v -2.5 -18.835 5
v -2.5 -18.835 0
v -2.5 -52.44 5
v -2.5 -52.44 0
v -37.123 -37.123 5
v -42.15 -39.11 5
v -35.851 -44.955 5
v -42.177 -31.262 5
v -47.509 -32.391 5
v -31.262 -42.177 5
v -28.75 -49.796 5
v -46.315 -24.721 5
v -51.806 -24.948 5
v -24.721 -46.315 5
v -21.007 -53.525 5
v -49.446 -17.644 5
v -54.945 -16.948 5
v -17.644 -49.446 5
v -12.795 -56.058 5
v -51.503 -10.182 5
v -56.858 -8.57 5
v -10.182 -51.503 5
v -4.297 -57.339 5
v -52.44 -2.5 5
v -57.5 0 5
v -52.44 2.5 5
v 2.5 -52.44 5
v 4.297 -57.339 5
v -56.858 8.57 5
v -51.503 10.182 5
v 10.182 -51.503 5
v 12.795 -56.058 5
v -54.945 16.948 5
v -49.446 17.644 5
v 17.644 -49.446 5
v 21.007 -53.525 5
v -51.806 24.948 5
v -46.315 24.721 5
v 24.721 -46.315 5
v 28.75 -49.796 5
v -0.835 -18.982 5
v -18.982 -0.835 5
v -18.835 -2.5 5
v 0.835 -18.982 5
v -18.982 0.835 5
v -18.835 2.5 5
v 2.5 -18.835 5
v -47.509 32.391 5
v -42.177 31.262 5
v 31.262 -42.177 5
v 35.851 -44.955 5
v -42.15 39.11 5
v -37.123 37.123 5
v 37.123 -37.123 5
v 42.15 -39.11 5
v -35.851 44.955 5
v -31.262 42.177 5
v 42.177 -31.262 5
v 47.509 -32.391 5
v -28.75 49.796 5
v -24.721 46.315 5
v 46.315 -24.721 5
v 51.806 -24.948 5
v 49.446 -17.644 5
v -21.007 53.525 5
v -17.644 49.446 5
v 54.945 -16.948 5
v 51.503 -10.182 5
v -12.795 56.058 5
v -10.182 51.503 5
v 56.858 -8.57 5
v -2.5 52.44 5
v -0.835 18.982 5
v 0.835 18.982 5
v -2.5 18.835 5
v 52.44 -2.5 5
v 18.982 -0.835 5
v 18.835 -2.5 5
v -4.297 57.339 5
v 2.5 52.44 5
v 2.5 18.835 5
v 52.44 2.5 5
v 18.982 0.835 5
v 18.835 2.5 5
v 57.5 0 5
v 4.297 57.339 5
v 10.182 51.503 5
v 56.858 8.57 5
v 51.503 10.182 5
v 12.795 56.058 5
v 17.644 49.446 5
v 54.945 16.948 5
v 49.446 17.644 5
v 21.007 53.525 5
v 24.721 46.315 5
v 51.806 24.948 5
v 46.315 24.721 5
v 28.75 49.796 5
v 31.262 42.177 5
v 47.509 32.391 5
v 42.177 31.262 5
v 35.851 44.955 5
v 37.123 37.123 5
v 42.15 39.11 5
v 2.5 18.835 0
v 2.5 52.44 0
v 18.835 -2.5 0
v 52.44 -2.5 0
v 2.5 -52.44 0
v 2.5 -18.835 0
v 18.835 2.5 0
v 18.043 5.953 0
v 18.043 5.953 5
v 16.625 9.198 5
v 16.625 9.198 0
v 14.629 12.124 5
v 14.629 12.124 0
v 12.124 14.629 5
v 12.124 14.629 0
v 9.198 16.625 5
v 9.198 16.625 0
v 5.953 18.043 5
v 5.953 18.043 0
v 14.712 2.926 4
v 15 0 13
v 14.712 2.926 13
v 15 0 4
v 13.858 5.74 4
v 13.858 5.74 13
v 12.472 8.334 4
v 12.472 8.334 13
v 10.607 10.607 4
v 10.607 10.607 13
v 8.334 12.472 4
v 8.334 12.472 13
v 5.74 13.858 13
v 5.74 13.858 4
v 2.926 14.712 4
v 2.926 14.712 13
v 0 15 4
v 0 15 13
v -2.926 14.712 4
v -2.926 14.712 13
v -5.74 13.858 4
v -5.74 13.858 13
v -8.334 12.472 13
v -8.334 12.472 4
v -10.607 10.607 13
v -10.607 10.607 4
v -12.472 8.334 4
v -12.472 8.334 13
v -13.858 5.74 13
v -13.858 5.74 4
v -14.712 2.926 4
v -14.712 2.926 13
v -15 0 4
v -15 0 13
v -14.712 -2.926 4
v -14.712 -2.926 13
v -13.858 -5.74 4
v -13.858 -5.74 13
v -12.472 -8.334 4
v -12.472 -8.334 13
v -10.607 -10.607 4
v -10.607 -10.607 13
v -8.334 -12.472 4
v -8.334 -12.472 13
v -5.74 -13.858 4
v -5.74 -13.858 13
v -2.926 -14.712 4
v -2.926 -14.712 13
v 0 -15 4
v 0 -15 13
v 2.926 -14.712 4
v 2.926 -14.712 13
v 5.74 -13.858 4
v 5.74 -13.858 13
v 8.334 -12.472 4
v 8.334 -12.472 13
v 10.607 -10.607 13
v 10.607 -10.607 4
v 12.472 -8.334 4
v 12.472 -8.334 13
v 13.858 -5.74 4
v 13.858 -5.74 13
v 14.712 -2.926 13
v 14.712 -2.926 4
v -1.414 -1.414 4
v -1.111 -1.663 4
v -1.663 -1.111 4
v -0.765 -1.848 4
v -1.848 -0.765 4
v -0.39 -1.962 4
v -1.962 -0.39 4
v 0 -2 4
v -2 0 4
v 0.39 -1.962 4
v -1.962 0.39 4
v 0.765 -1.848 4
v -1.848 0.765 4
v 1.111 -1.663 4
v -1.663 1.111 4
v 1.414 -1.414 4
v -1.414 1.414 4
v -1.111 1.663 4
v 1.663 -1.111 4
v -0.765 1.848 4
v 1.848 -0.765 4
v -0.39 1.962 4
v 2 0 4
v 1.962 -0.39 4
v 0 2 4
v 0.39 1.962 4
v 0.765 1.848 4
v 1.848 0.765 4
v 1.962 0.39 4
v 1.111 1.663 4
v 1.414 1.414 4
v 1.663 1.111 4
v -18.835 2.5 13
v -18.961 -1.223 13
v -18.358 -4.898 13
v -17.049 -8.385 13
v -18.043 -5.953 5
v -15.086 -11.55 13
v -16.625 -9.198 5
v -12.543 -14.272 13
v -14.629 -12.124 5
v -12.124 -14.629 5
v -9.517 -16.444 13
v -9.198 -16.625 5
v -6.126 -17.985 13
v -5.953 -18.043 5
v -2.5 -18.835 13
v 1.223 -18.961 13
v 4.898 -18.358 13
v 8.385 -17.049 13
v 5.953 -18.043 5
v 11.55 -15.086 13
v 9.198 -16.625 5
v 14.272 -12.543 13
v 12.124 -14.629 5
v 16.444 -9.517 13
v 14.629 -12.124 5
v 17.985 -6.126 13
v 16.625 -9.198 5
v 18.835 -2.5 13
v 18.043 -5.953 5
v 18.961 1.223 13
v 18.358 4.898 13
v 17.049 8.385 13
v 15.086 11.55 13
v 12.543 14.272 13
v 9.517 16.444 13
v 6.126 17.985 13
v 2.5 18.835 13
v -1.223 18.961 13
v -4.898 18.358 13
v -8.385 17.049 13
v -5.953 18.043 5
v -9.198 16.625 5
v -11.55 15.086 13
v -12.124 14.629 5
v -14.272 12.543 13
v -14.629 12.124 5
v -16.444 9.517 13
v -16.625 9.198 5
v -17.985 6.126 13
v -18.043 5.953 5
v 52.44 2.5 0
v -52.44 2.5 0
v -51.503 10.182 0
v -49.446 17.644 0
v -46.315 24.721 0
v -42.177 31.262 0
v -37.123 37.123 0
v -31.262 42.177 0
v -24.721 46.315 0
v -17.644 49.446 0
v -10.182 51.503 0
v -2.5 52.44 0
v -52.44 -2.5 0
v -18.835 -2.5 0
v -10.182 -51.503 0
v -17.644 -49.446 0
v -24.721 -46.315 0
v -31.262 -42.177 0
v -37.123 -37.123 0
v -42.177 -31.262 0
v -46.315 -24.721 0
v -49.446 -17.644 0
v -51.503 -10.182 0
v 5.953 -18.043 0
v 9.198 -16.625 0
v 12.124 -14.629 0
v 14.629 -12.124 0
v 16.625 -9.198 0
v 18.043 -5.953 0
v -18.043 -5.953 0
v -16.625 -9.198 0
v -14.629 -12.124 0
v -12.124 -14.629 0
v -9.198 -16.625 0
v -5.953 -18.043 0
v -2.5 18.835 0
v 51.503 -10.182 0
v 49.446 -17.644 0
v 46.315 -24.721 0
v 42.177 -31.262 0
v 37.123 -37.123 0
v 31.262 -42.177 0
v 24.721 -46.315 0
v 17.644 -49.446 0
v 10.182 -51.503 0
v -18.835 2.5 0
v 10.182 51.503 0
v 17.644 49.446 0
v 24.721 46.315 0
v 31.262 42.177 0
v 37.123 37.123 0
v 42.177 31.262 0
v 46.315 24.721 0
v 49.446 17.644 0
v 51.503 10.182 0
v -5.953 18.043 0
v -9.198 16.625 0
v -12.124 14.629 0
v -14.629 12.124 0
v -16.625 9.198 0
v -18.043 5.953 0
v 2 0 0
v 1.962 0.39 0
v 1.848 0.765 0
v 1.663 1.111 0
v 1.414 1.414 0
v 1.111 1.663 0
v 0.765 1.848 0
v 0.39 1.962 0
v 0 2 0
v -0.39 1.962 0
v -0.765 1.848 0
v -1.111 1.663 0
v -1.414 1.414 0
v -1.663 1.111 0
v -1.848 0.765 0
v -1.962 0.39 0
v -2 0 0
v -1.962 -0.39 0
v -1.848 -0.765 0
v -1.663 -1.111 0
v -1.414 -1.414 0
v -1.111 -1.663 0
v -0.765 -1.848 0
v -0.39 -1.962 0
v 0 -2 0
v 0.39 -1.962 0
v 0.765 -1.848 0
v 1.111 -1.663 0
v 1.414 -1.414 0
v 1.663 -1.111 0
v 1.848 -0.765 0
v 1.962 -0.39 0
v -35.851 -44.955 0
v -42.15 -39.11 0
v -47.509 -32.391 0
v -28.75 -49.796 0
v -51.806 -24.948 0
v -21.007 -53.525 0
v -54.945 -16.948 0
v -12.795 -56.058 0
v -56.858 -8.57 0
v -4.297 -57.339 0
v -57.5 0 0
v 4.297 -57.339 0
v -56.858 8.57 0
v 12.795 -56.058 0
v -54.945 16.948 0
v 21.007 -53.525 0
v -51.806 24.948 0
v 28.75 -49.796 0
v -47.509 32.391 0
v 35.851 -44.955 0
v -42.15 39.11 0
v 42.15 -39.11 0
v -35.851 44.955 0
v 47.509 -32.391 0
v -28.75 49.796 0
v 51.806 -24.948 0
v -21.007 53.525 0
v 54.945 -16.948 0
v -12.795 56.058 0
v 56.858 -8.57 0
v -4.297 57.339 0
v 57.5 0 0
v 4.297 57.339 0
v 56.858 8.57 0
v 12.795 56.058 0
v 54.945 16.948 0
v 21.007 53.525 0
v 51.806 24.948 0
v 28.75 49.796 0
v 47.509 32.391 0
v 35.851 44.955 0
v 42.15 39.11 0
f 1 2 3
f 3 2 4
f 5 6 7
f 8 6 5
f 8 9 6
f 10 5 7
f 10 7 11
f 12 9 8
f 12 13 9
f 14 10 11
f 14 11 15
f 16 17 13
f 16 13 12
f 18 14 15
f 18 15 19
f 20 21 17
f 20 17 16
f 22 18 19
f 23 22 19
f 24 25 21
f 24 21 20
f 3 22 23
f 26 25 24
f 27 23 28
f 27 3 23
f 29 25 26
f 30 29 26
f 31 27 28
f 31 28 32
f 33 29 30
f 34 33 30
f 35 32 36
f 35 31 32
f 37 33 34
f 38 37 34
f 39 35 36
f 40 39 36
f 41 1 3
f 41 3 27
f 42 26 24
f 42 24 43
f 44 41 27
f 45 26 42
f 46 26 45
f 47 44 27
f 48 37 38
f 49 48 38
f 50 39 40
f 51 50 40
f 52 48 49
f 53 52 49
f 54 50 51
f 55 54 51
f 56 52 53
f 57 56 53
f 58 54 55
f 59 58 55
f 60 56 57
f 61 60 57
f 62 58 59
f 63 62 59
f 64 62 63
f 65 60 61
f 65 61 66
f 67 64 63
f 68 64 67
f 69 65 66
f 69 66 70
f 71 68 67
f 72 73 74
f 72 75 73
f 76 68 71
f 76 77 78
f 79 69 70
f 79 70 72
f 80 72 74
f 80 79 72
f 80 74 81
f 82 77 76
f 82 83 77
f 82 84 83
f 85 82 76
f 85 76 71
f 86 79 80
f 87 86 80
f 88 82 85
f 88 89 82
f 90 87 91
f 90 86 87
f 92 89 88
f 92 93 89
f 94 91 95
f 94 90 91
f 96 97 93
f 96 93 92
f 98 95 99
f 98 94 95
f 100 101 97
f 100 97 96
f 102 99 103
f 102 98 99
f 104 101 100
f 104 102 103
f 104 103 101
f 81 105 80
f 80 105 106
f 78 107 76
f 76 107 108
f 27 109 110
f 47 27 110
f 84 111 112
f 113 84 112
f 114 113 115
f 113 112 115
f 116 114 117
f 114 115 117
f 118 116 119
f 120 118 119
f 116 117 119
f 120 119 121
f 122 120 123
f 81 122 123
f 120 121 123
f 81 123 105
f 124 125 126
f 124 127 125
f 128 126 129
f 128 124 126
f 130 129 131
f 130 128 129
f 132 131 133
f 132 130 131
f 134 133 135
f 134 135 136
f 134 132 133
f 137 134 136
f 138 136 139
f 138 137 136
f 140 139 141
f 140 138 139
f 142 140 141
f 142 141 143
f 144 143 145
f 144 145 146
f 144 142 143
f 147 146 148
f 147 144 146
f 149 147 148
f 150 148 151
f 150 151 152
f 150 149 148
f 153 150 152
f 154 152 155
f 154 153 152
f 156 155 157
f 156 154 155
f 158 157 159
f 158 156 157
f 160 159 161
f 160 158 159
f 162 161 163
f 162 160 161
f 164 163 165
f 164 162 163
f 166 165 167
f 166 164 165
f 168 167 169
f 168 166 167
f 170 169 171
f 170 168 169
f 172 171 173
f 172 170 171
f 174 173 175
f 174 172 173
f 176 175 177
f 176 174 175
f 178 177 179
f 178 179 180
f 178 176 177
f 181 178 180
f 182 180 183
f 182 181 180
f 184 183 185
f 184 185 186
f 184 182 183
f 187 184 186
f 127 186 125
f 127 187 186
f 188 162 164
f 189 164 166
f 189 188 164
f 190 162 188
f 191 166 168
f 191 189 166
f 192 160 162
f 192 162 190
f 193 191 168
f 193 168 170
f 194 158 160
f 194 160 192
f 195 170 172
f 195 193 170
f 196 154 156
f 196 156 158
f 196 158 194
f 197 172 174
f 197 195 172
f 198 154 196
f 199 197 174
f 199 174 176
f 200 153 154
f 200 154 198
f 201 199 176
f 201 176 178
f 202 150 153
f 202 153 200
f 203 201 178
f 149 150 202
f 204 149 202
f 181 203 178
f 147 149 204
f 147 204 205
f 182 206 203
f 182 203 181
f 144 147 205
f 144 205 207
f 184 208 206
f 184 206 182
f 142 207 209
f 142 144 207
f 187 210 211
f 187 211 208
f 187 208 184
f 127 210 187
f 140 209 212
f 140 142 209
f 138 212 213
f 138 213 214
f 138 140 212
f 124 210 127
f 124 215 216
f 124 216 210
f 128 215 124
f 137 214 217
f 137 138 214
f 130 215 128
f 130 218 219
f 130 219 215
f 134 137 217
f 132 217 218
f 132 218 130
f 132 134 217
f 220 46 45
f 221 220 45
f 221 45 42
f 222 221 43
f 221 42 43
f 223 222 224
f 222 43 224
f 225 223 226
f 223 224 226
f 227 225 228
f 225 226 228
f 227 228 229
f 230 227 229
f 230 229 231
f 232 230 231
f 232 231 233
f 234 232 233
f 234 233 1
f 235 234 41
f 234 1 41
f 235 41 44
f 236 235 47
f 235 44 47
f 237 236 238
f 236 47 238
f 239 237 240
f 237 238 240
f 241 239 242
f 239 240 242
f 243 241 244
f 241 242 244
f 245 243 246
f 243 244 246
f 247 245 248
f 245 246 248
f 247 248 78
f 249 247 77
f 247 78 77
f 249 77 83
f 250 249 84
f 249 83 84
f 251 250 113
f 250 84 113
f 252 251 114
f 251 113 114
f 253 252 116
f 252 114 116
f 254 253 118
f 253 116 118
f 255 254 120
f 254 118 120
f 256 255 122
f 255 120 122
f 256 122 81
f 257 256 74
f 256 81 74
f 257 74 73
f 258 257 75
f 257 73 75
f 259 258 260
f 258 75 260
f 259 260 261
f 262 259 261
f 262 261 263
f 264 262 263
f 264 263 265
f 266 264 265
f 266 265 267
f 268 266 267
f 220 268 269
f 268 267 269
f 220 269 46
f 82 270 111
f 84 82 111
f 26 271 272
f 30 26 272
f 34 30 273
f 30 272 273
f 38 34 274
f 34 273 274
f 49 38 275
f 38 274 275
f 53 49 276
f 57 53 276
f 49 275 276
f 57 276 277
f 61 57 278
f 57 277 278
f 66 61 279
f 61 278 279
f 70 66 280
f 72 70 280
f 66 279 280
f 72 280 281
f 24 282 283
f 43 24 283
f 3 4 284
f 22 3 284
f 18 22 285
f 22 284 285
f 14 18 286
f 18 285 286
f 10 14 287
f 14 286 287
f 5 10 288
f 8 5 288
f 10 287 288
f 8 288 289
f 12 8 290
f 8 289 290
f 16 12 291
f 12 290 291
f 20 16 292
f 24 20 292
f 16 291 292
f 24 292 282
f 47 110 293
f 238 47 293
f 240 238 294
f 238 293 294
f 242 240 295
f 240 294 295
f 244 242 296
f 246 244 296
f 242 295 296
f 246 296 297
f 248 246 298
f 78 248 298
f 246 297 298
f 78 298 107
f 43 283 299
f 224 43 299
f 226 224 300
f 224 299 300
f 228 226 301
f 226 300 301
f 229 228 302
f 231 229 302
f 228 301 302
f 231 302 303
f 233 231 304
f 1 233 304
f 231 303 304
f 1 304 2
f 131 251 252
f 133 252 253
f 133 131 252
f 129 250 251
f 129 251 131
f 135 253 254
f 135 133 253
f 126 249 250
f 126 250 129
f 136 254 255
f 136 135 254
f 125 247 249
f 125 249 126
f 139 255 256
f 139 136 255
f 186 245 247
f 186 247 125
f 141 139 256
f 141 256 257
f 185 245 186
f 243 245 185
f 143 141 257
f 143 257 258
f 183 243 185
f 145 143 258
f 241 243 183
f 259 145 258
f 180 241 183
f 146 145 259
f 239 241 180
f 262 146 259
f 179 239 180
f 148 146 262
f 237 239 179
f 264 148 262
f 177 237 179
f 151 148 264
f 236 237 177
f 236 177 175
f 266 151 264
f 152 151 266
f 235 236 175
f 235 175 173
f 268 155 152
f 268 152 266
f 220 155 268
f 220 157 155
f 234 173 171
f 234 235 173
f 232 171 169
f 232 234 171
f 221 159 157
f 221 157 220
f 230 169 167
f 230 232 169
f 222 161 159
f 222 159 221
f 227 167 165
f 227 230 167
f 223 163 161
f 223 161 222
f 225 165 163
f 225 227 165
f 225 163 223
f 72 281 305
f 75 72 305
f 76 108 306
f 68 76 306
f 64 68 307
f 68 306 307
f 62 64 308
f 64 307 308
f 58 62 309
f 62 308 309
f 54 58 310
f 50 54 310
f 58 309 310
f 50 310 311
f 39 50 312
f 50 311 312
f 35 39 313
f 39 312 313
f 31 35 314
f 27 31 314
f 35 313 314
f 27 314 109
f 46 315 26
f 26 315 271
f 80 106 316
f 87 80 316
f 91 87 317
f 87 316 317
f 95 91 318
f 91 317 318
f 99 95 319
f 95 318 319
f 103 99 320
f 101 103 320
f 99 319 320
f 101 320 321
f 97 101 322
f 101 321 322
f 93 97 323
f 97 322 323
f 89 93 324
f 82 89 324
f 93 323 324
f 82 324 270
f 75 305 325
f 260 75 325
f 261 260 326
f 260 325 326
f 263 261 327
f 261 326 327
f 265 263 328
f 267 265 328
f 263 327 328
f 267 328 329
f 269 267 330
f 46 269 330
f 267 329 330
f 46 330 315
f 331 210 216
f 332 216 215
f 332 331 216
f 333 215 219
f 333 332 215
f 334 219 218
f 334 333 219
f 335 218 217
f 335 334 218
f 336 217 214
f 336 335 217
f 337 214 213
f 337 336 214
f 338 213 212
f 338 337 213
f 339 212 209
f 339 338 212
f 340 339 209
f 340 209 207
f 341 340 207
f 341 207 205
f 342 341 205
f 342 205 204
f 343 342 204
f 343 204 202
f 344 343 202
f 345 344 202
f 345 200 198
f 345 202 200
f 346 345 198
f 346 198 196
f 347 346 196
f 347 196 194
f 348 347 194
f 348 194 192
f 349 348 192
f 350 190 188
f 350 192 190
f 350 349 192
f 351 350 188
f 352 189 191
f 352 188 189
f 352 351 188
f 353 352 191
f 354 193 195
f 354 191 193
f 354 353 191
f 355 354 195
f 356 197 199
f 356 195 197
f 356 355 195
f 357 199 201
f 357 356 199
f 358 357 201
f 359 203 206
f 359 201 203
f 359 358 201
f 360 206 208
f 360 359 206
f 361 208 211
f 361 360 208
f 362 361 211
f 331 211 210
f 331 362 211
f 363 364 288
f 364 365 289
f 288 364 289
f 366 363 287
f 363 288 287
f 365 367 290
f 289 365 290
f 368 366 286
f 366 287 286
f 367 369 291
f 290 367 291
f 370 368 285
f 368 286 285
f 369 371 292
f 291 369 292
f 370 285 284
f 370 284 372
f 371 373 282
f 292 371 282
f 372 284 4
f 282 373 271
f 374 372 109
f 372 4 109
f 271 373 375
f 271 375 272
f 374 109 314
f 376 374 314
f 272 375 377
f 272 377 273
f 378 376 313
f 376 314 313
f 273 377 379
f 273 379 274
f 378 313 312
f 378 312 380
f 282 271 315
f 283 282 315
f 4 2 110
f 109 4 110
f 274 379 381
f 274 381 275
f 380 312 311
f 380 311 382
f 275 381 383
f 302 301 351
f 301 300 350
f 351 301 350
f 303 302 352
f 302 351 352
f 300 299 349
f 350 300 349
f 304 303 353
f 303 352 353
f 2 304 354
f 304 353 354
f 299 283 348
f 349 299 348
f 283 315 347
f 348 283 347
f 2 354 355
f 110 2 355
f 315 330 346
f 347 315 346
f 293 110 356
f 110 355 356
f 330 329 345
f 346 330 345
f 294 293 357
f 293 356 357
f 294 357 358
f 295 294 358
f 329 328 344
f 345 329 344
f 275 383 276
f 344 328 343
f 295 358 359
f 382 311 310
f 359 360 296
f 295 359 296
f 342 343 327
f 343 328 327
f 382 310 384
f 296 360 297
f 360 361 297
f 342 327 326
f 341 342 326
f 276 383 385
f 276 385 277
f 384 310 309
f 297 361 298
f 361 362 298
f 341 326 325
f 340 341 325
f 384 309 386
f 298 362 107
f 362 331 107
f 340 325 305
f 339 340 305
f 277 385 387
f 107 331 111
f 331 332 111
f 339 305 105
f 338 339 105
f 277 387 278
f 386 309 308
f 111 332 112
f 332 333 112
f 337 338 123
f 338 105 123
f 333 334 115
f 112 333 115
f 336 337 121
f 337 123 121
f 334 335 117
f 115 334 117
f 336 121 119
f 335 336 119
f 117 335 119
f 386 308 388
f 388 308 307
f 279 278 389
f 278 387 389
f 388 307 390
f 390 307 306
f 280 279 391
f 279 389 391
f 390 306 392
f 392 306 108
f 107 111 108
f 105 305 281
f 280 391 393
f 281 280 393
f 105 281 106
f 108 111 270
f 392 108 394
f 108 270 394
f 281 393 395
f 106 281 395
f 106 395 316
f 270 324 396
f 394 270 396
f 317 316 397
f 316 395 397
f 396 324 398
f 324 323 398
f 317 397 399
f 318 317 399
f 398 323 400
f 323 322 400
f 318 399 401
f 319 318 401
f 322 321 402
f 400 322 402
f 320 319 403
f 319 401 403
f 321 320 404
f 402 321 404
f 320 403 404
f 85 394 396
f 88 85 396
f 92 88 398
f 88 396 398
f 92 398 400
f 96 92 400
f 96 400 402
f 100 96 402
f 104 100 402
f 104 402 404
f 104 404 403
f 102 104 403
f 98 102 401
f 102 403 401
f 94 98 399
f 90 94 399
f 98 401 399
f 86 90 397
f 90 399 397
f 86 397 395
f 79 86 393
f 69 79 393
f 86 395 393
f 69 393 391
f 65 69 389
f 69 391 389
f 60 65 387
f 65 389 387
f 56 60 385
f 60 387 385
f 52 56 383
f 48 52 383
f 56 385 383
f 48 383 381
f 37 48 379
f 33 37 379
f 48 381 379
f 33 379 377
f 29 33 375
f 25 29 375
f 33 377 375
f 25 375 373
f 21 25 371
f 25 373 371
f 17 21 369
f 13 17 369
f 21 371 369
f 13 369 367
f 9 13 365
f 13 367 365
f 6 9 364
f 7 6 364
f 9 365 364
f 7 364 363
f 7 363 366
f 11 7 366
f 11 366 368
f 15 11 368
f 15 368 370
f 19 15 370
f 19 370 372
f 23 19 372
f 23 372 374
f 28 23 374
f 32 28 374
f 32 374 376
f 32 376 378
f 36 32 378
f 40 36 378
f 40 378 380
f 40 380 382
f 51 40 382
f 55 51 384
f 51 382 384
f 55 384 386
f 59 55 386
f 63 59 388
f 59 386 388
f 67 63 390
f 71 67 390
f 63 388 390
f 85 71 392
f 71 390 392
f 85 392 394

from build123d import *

# Parameters (mm, degrees)
SKETCH1_R           = 57.5
SKETCH1_R_2         = 2
BOSS_EXTRUDE1_DEPTH = 5
SKETCH2_R           = 15
CUT_EXTRUDE1_DEPTH  = 1
SKETCH3_R           = 19
SKETCH3_R_2         = 15
BOSS_EXTRUDE3_DEPTH = 8


with BuildPart() as part:
    # Sketch1 → Boss-Extrude1 (new body)
    # profile 1 of 6: a face of its own
    with BuildSketch(Plane.XY):
        Circle(SKETCH1_R)
        with BuildLine():
            ThreePointArc((-52.440442409, 2.5), (-37.123106012, 37.123106012), (-2.5, 52.440442409))
            Line((-2.5, 52.440442409), (-2.5, 18.834808202))
            ThreePointArc((-2.5, 18.834808202), (0, 19), (2.5, 18.834808202))
            Line((2.5, 18.834808202), (2.5, 52.440442409))
            ThreePointArc((2.5, 52.440442409), (37.123106012, 37.123106012), (52.440442409, 2.5))
            Line((52.440442409, 2.5), (18.834808202, 2.5))
            ThreePointArc((18.834808202, 2.5), (18.958657071, 1.252725861), (19, 0))
            ThreePointArc((19, 0), (18.958657071, -1.252725861), (18.834808202, -2.5))
            Line((18.834808202, -2.5), (52.440442409, -2.5))
            ThreePointArc((52.440442409, -2.5), (37.123106012, -37.123106012), (2.5, -52.440442409))
            Line((2.5, -52.440442409), (2.5, -18.834808202))
            ThreePointArc((2.5, -18.834808202), (0, -19), (-2.5, -18.834808202))
            Line((-2.5, -18.834808202), (-2.5, -52.440442409))
            ThreePointArc((-2.5, -52.440442409), (-37.123106012, -37.123106012), (-52.440442409, -2.5))
            Line((-52.440442409, -2.5), (-18.834808202, -2.5))
            ThreePointArc((-18.834808202, -2.5), (-19, 0), (-18.834808202, 2.5))
            Line((-18.834808202, 2.5), (-52.440442409, 2.5))
        make_face(mode=Mode.SUBTRACT)
    # profile 2 of 6: a face of its own
    with BuildSketch(Plane.XY):
        with BuildLine():
            Line((-2.5, 14.790199458), (-2.5, 18.834808202))
            ThreePointArc((-2.5, 18.834808202), (-13.435028843, 13.435028843), (-18.834808202, 2.5))
            Line((-18.834808202, 2.5), (-14.790199458, 2.5))
            ThreePointArc((-14.790199458, 2.5), (-10.606601718, 10.606601718), (-2.5, 14.790199458))
        make_face()
    # profile 3 of 6: a face of its own
    with BuildSketch(Plane.XY):
        with BuildLine():
            Line((-14.790199458, -2.5), (-18.834808202, -2.5))
            ThreePointArc((-18.834808202, -2.5), (-13.435028843, -13.435028843), (-2.5, -18.834808202))
            Line((-2.5, -18.834808202), (-2.5, -14.790199458))
            ThreePointArc((-2.5, -14.790199458), (-10.606601718, -10.606601718), (-14.790199458, -2.5))
        make_face()
    # profile 4 of 6: a face of its own
    with BuildSketch(Plane.XY):
        with BuildLine():
            ThreePointArc((2.5, 18.834808202), (0, 19), (-2.5, 18.834808202))
            Line((-2.5, 18.834808202), (-2.5, 14.790199458))
            ThreePointArc((-2.5, 14.790199458), (-10.606601718, 10.606601718), (-14.790199458, 2.5))
            Line((-14.790199458, 2.5), (-18.834808202, 2.5))
            ThreePointArc((-18.834808202, 2.5), (-19, 0), (-18.834808202, -2.5))
            Line((-18.834808202, -2.5), (-14.790199458, -2.5))
            ThreePointArc((-14.790199458, -2.5), (-10.606601718, -10.606601718), (-2.5, -14.790199458))
            Line((-2.5, -14.790199458), (-2.5, -18.834808202))
            ThreePointArc((-2.5, -18.834808202), (0, -19), (2.5, -18.834808202))
            Line((2.5, -18.834808202), (2.5, -14.790199458))
            ThreePointArc((2.5, -14.790199458), (10.606601718, -10.606601718), (14.790199458, -2.5))
            Line((14.790199458, -2.5), (18.834808202, -2.5))
            ThreePointArc((18.834808202, -2.5), (18.958657071, -1.252725861), (19, 0))
            ThreePointArc((19, 0), (18.958657071, 1.252725861), (18.834808202, 2.5))
            Line((18.834808202, 2.5), (14.790199458, 2.5))
            ThreePointArc((14.790199458, 2.5), (10.606601718, 10.606601718), (2.5, 14.790199458))
            Line((2.5, 14.790199458), (2.5, 18.834808202))
        make_face()
        Circle(SKETCH1_R_2, mode=Mode.SUBTRACT)
    # profile 5 of 6: a face of its own
    with BuildSketch(Plane.XY):
        with BuildLine():
            ThreePointArc((18.834808202, 2.5), (13.435028843, 13.435028843), (2.5, 18.834808202))
            Line((2.5, 18.834808202), (2.5, 14.790199458))
            ThreePointArc((2.5, 14.790199458), (10.606601718, 10.606601718), (14.790199458, 2.5))
            Line((14.790199458, 2.5), (18.834808202, 2.5))
        make_face()
    # profile 6 of 6: a face of its own
    with BuildSketch(Plane.XY):
        with BuildLine():
            ThreePointArc((2.5, -18.834808202), (13.435028843, -13.435028843), (18.834808202, -2.5))
            Line((18.834808202, -2.5), (14.790199458, -2.5))
            ThreePointArc((14.790199458, -2.5), (10.606601718, -10.606601718), (2.5, -14.790199458))
            Line((2.5, -14.790199458), (2.5, -18.834808202))
        make_face()
    extrude(amount=BOSS_EXTRUDE1_DEPTH)

    # Sketch2 → Cut-Extrude1 (cut)
    with BuildSketch(Plane.XY.offset(5)):
        Circle(SKETCH2_R)
    extrude(amount=-CUT_EXTRUDE1_DEPTH, mode=Mode.SUBTRACT)

    # Sketch3 → Boss-Extrude3 (add)
    with BuildSketch(Plane.XY.offset(5)):
        with Locations(Location((0, 0, 0), (0, 0, 172.439156823))):
            Circle(SKETCH3_R)
        Circle(SKETCH3_R_2, mode=Mode.SUBTRACT)
    extrude(amount=BOSS_EXTRUDE3_DEPTH)


solid = part.part
